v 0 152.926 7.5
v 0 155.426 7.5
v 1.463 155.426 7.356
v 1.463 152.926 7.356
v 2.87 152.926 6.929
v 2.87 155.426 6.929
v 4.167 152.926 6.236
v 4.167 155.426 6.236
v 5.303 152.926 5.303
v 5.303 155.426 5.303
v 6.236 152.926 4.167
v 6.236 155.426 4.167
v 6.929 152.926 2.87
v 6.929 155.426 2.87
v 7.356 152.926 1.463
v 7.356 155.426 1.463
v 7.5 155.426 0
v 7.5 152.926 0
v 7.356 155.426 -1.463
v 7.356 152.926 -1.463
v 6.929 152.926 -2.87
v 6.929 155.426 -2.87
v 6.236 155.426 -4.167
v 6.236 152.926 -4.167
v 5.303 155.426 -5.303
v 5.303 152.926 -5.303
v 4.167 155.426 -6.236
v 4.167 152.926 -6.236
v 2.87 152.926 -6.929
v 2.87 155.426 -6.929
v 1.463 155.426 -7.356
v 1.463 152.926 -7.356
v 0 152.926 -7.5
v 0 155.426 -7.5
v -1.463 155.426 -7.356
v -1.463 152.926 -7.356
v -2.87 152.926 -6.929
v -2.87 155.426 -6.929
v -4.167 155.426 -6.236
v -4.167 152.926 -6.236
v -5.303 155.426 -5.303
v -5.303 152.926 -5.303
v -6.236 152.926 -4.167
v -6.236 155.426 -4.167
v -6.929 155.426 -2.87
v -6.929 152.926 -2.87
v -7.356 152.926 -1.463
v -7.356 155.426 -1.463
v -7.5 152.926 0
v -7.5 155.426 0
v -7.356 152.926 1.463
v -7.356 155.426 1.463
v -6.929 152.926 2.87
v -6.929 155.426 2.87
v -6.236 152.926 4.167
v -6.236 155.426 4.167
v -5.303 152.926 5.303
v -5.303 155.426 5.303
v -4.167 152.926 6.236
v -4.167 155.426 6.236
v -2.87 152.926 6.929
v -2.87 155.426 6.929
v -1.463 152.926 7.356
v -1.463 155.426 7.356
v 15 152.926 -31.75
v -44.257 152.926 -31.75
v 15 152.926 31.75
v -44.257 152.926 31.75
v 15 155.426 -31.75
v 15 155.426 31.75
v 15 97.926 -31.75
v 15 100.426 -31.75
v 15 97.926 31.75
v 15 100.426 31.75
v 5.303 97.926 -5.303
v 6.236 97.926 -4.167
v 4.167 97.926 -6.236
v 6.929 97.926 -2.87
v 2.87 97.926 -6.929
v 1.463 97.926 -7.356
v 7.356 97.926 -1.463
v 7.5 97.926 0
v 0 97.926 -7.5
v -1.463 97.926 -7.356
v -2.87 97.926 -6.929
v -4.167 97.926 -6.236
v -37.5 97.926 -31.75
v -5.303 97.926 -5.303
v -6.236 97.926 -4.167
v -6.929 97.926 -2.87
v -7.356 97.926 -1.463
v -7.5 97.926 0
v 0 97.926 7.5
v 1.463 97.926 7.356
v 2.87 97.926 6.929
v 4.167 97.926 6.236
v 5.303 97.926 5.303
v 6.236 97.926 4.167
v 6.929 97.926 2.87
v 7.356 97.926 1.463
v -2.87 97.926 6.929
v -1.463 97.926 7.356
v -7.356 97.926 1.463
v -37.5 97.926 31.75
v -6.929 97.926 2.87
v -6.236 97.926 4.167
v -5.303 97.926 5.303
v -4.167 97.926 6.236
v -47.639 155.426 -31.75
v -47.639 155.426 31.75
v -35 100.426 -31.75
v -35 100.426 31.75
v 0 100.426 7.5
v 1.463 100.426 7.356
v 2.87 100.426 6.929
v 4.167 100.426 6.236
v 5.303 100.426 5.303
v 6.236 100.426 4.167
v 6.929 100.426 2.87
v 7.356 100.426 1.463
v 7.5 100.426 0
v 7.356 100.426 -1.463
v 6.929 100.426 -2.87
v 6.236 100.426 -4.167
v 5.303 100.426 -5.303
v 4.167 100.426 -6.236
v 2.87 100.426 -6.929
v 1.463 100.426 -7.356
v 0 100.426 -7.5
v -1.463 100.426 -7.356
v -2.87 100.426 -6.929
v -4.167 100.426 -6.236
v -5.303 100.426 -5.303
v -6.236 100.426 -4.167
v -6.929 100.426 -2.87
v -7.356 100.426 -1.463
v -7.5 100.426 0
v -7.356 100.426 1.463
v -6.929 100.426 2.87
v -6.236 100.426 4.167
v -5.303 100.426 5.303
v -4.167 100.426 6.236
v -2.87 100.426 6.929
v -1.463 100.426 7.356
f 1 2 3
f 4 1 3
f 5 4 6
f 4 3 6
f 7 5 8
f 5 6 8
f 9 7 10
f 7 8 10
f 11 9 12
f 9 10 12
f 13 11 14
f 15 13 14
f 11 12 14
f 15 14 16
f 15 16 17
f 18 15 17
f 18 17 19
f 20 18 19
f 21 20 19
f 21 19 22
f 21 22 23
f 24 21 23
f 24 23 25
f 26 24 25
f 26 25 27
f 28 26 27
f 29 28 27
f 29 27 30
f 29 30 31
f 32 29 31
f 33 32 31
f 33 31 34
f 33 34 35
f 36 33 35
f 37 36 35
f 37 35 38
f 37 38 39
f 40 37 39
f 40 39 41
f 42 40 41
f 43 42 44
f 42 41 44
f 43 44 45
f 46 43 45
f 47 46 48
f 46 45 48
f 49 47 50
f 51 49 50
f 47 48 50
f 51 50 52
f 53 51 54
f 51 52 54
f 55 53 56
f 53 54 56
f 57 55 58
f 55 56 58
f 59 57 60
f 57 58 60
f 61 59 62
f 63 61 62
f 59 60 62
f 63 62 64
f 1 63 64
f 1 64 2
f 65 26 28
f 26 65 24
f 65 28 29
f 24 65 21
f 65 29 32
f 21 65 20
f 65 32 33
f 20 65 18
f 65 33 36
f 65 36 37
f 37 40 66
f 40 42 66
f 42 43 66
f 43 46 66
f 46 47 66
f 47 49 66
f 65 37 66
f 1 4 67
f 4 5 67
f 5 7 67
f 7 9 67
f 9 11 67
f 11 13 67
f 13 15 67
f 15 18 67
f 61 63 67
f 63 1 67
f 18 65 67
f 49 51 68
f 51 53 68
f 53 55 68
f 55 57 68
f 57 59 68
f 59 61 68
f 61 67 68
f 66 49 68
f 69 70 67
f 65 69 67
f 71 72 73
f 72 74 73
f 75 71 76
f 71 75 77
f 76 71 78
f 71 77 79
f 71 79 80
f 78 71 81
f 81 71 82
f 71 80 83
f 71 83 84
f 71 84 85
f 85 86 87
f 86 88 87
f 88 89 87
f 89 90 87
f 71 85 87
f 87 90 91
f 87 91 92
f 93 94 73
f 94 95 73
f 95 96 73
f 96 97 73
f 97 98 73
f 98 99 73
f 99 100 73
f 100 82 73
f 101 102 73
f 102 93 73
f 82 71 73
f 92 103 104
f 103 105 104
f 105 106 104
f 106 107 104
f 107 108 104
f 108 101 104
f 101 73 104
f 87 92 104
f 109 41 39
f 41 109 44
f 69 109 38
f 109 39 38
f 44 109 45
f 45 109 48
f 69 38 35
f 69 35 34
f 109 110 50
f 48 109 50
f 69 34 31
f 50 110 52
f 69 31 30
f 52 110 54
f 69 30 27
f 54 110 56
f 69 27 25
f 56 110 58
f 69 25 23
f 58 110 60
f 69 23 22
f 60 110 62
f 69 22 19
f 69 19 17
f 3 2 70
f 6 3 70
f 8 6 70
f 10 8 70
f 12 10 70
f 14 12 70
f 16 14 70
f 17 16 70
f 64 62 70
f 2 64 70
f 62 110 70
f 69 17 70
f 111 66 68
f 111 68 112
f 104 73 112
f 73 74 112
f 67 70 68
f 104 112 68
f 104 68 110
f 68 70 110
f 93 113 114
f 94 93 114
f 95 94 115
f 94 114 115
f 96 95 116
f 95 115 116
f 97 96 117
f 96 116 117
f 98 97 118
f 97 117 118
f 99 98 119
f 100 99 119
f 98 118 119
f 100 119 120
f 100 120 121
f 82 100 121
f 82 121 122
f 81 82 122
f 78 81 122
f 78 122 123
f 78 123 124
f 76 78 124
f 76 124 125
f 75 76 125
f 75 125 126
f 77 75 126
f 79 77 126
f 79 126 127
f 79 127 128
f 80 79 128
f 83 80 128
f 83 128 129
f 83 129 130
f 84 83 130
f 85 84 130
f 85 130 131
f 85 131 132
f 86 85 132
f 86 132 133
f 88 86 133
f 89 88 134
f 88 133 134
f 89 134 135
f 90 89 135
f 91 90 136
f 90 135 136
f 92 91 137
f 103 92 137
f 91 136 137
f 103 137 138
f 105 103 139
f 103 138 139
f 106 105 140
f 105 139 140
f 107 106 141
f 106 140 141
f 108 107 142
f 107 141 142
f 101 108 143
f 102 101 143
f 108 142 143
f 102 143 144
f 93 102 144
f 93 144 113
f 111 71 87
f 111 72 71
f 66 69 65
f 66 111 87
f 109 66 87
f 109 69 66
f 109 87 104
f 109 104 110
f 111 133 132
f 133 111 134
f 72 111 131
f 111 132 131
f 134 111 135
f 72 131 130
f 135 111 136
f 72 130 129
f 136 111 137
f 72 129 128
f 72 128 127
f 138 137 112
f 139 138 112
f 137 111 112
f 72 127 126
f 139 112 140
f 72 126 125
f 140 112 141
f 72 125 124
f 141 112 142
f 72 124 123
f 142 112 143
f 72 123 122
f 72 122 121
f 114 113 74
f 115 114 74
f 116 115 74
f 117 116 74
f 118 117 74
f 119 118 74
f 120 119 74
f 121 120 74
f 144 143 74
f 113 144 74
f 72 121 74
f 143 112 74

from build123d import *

# Parameters (mm, degrees)
BOSS_EXTRUDE1_DEPTH = 31.75
BOSS_EXTRUDE3_DEPTH = 63.5
CUT_EXTRUDE1_DEPTH  = 175.52526199
SKETCH4_R           = 7.5
CUT_EXTRUDE2_DEPTH  = 82.140420864


with BuildPart() as part:
    # Sketch1 → Boss-Extrude1 (new, symmetric)
    with BuildSketch(Plane.XY):
        Polygon((15, 152.926386675), (-35, 152.926386675), (-35, 100.426386675), (15, 100.426386675), (15, 97.926386675), (-37.5, 97.926386675), (-37.5, 155.426386675), (15, 155.426386675), align=None)
    extrude(amount=BOSS_EXTRUDE1_DEPTH, both=True)

    # Sketch2 → Boss-Extrude3 (add)
    with BuildSketch(Plane.XY.offset(31.75)):
        Polygon((-37.5, 97.926386675), (-47.638801391, 155.426386675), (-37.5, 155.426386675), align=None)
    extrude(amount=-BOSS_EXTRUDE3_DEPTH)

    # Sketch3 → Cut-Extrude1 (cut, through all)
    with BuildSketch(Plane.XY.offset(31.75)):
        Polygon((-35, 152.926386675), (-44.257166487, 152.926386675), (-35, 100.426386675), align=None)
    extrude(amount=-CUT_EXTRUDE1_DEPTH, mode=Mode.SUBTRACT)

    # Sketch4 → Cut-Extrude2 (cut, through all)
    with BuildSketch(Plane(origin=(0, 155.426386675, 0), x_dir=(1, 0, 0), z_dir=(0, 1, 0))):
        with Locations(Location((0, 0, 0), (0, 0, 270))):
            Circle(SKETCH4_R)
    extrude(amount=-CUT_EXTRUDE2_DEPTH, mode=Mode.SUBTRACT)


solid = part.part
